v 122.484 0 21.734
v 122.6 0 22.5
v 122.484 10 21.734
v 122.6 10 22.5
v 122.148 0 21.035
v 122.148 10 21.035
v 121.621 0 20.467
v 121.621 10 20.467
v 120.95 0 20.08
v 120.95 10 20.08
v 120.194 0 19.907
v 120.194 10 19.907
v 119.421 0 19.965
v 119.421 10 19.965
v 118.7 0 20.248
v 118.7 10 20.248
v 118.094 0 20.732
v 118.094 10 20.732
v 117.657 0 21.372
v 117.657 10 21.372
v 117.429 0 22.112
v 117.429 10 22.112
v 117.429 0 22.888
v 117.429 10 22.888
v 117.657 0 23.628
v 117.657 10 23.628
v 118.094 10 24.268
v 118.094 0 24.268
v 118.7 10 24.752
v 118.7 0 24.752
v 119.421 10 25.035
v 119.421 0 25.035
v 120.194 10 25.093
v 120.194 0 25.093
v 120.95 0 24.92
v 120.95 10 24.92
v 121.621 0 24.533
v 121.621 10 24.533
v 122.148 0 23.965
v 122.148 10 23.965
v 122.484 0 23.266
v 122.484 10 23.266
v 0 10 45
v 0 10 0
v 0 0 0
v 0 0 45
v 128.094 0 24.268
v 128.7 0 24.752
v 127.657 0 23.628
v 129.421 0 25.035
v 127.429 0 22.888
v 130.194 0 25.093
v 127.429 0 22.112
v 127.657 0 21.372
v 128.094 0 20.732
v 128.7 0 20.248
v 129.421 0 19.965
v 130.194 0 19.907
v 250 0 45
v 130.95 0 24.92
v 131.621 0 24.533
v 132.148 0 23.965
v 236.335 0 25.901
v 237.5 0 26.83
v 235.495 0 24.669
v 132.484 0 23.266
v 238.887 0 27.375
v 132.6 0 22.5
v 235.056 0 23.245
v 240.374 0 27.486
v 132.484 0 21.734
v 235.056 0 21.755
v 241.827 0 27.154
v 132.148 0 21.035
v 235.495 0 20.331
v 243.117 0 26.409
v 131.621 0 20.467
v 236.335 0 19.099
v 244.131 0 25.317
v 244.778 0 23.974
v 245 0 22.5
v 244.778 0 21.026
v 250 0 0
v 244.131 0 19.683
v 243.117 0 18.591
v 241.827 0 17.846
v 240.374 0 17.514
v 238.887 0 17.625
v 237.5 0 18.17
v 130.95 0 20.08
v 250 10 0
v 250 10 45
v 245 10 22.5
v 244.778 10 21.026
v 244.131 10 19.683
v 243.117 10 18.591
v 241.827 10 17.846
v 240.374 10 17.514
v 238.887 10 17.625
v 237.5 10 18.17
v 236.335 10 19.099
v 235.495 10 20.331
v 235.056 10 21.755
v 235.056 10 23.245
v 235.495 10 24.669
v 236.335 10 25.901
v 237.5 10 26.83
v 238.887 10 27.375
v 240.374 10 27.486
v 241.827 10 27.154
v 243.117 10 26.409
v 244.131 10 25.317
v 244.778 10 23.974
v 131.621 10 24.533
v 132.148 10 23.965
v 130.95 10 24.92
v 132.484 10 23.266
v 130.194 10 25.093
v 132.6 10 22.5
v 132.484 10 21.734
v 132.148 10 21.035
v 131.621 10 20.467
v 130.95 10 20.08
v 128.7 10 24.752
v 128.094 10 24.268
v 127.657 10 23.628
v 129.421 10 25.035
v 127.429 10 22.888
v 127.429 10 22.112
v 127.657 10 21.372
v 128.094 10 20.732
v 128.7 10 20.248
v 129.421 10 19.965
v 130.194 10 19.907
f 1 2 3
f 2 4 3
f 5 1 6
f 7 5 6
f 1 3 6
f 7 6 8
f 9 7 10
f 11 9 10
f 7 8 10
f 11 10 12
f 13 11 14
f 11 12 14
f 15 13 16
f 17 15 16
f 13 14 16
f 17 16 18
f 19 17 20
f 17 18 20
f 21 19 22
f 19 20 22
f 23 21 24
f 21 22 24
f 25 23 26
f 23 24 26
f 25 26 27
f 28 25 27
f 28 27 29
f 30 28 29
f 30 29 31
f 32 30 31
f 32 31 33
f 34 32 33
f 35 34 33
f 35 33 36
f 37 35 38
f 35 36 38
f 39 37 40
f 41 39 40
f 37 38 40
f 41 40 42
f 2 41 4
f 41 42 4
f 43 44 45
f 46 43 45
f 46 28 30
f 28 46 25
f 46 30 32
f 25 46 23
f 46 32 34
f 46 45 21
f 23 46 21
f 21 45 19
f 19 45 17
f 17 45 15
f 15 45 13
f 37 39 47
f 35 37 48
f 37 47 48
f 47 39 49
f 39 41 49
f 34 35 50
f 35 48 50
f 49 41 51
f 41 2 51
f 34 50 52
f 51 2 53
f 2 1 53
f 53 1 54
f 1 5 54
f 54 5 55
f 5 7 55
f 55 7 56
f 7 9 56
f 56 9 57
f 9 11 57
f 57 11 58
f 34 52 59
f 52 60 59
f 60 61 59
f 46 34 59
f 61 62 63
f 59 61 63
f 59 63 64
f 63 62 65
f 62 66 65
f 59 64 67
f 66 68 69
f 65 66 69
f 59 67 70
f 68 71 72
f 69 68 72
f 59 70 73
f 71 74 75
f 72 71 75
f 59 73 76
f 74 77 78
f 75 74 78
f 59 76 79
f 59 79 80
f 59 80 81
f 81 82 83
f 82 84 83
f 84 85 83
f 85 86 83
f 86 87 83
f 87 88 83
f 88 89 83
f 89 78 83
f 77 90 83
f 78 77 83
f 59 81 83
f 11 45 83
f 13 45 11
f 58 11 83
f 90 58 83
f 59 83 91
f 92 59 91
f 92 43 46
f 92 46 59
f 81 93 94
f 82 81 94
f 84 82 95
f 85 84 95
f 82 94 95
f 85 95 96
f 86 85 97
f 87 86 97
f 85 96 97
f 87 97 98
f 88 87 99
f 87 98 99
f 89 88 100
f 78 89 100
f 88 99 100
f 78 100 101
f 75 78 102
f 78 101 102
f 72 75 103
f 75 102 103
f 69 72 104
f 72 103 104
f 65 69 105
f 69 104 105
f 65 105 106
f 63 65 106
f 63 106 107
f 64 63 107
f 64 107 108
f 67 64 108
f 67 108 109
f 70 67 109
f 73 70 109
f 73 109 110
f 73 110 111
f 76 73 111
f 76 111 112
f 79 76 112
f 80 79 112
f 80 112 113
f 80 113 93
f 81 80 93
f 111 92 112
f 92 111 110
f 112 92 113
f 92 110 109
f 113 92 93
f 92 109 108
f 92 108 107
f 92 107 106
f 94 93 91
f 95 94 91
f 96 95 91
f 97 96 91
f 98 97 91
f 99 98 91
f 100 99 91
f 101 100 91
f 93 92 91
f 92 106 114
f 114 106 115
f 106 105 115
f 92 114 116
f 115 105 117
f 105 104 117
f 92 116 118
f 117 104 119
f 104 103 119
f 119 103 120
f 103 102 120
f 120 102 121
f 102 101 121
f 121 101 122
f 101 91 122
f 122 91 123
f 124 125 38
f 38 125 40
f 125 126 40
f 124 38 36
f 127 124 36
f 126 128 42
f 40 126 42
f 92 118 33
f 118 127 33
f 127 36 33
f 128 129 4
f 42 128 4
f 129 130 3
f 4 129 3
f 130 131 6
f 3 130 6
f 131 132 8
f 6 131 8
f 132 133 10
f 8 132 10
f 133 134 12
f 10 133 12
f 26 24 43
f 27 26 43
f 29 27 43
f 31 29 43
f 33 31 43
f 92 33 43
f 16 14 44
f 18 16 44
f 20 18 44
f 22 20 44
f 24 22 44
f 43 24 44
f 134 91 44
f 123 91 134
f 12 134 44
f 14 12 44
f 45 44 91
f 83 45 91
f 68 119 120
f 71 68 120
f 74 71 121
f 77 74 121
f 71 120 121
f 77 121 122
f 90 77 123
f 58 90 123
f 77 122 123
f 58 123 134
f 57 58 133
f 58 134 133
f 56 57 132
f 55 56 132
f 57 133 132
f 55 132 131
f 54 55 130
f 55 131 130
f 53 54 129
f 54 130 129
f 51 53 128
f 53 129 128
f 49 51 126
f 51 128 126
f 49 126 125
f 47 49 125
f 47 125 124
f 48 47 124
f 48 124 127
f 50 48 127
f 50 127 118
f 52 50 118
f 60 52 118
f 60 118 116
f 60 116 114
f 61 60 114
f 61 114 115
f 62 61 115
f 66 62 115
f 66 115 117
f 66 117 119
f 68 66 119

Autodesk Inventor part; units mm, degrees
sketch "스케치1" plane through (0, 0, 0) normal (0, 0, 1) x (1, 0, 0)
  line L0 (0, 0) -> (250, 0)
  line L1 (250, 0) -> (250, 10)
  line L2 (250, 10) -> (0, 10)
  line L3 (0, 10) -> (0, 0)
  dimension "d0" = 250
  dimension "d1" = 10
extrude "돌출1" add sketch "스케치1" along normal blind 45
ref_plane "작업 평면1" through (125, 0, 0) normal (-1, 0, 0) x (0, 0, 1)
ref_plane "작업 평면2" through (65, 40, 45) normal (0, 1, 0) x (1, 0, 0)
ref_plane "작업 평면3" through (125, 0, 0) normal (1, 0, 0) x (0, 0, -1)
sketch "스케치4" plane through (0, 10, 0) normal (0, 1, 0) x (1, 0, 0)
  line L0 (250, 0) -> (0, 0) projected
  line L1 (0, 0) -> (0, -45) projected
  line L2 (250, -45) -> (0, -45) projected
  line L3 (250, 0) -> (250, -45) projected
  circle A0 centre (120, -22.5) radius 2.6
  circle A1 centre (130, -22.5) radius 2.6
  line L4 (250, 0) -> (0, 0) projected
  point P0 (125, 0)
  point P1 (125, 0)
  dimension "d16" = 5.2
  dimension "d17" = 5.2
  dimension "d18" = 10
  dimension "d19" = 5
extrude "돌출4" cut sketch "스케치4" against normal through all contours A0 | A1
ref_plane "작업 평면4" through (0, 0, 22.5) normal (0, 0, -1) x (-1, 0, 0)
sketch "스케치6" plane through (0, 10, 0) normal (0, 1, 0) x (1, 0, 0)
  line L0 (250, 0) -> (250, -45) projected
  circle A0 centre (240, -22.5) radius 5
  point P0 (0, 0)
  point P1 (250, -22.5)
  point P2 (250, -22.5)
  dimension "d32" = 10
  dimension "d33" = 10
extrude "돌출6" cut sketch "스케치6" against normal through all
properties part number "다리-3"
